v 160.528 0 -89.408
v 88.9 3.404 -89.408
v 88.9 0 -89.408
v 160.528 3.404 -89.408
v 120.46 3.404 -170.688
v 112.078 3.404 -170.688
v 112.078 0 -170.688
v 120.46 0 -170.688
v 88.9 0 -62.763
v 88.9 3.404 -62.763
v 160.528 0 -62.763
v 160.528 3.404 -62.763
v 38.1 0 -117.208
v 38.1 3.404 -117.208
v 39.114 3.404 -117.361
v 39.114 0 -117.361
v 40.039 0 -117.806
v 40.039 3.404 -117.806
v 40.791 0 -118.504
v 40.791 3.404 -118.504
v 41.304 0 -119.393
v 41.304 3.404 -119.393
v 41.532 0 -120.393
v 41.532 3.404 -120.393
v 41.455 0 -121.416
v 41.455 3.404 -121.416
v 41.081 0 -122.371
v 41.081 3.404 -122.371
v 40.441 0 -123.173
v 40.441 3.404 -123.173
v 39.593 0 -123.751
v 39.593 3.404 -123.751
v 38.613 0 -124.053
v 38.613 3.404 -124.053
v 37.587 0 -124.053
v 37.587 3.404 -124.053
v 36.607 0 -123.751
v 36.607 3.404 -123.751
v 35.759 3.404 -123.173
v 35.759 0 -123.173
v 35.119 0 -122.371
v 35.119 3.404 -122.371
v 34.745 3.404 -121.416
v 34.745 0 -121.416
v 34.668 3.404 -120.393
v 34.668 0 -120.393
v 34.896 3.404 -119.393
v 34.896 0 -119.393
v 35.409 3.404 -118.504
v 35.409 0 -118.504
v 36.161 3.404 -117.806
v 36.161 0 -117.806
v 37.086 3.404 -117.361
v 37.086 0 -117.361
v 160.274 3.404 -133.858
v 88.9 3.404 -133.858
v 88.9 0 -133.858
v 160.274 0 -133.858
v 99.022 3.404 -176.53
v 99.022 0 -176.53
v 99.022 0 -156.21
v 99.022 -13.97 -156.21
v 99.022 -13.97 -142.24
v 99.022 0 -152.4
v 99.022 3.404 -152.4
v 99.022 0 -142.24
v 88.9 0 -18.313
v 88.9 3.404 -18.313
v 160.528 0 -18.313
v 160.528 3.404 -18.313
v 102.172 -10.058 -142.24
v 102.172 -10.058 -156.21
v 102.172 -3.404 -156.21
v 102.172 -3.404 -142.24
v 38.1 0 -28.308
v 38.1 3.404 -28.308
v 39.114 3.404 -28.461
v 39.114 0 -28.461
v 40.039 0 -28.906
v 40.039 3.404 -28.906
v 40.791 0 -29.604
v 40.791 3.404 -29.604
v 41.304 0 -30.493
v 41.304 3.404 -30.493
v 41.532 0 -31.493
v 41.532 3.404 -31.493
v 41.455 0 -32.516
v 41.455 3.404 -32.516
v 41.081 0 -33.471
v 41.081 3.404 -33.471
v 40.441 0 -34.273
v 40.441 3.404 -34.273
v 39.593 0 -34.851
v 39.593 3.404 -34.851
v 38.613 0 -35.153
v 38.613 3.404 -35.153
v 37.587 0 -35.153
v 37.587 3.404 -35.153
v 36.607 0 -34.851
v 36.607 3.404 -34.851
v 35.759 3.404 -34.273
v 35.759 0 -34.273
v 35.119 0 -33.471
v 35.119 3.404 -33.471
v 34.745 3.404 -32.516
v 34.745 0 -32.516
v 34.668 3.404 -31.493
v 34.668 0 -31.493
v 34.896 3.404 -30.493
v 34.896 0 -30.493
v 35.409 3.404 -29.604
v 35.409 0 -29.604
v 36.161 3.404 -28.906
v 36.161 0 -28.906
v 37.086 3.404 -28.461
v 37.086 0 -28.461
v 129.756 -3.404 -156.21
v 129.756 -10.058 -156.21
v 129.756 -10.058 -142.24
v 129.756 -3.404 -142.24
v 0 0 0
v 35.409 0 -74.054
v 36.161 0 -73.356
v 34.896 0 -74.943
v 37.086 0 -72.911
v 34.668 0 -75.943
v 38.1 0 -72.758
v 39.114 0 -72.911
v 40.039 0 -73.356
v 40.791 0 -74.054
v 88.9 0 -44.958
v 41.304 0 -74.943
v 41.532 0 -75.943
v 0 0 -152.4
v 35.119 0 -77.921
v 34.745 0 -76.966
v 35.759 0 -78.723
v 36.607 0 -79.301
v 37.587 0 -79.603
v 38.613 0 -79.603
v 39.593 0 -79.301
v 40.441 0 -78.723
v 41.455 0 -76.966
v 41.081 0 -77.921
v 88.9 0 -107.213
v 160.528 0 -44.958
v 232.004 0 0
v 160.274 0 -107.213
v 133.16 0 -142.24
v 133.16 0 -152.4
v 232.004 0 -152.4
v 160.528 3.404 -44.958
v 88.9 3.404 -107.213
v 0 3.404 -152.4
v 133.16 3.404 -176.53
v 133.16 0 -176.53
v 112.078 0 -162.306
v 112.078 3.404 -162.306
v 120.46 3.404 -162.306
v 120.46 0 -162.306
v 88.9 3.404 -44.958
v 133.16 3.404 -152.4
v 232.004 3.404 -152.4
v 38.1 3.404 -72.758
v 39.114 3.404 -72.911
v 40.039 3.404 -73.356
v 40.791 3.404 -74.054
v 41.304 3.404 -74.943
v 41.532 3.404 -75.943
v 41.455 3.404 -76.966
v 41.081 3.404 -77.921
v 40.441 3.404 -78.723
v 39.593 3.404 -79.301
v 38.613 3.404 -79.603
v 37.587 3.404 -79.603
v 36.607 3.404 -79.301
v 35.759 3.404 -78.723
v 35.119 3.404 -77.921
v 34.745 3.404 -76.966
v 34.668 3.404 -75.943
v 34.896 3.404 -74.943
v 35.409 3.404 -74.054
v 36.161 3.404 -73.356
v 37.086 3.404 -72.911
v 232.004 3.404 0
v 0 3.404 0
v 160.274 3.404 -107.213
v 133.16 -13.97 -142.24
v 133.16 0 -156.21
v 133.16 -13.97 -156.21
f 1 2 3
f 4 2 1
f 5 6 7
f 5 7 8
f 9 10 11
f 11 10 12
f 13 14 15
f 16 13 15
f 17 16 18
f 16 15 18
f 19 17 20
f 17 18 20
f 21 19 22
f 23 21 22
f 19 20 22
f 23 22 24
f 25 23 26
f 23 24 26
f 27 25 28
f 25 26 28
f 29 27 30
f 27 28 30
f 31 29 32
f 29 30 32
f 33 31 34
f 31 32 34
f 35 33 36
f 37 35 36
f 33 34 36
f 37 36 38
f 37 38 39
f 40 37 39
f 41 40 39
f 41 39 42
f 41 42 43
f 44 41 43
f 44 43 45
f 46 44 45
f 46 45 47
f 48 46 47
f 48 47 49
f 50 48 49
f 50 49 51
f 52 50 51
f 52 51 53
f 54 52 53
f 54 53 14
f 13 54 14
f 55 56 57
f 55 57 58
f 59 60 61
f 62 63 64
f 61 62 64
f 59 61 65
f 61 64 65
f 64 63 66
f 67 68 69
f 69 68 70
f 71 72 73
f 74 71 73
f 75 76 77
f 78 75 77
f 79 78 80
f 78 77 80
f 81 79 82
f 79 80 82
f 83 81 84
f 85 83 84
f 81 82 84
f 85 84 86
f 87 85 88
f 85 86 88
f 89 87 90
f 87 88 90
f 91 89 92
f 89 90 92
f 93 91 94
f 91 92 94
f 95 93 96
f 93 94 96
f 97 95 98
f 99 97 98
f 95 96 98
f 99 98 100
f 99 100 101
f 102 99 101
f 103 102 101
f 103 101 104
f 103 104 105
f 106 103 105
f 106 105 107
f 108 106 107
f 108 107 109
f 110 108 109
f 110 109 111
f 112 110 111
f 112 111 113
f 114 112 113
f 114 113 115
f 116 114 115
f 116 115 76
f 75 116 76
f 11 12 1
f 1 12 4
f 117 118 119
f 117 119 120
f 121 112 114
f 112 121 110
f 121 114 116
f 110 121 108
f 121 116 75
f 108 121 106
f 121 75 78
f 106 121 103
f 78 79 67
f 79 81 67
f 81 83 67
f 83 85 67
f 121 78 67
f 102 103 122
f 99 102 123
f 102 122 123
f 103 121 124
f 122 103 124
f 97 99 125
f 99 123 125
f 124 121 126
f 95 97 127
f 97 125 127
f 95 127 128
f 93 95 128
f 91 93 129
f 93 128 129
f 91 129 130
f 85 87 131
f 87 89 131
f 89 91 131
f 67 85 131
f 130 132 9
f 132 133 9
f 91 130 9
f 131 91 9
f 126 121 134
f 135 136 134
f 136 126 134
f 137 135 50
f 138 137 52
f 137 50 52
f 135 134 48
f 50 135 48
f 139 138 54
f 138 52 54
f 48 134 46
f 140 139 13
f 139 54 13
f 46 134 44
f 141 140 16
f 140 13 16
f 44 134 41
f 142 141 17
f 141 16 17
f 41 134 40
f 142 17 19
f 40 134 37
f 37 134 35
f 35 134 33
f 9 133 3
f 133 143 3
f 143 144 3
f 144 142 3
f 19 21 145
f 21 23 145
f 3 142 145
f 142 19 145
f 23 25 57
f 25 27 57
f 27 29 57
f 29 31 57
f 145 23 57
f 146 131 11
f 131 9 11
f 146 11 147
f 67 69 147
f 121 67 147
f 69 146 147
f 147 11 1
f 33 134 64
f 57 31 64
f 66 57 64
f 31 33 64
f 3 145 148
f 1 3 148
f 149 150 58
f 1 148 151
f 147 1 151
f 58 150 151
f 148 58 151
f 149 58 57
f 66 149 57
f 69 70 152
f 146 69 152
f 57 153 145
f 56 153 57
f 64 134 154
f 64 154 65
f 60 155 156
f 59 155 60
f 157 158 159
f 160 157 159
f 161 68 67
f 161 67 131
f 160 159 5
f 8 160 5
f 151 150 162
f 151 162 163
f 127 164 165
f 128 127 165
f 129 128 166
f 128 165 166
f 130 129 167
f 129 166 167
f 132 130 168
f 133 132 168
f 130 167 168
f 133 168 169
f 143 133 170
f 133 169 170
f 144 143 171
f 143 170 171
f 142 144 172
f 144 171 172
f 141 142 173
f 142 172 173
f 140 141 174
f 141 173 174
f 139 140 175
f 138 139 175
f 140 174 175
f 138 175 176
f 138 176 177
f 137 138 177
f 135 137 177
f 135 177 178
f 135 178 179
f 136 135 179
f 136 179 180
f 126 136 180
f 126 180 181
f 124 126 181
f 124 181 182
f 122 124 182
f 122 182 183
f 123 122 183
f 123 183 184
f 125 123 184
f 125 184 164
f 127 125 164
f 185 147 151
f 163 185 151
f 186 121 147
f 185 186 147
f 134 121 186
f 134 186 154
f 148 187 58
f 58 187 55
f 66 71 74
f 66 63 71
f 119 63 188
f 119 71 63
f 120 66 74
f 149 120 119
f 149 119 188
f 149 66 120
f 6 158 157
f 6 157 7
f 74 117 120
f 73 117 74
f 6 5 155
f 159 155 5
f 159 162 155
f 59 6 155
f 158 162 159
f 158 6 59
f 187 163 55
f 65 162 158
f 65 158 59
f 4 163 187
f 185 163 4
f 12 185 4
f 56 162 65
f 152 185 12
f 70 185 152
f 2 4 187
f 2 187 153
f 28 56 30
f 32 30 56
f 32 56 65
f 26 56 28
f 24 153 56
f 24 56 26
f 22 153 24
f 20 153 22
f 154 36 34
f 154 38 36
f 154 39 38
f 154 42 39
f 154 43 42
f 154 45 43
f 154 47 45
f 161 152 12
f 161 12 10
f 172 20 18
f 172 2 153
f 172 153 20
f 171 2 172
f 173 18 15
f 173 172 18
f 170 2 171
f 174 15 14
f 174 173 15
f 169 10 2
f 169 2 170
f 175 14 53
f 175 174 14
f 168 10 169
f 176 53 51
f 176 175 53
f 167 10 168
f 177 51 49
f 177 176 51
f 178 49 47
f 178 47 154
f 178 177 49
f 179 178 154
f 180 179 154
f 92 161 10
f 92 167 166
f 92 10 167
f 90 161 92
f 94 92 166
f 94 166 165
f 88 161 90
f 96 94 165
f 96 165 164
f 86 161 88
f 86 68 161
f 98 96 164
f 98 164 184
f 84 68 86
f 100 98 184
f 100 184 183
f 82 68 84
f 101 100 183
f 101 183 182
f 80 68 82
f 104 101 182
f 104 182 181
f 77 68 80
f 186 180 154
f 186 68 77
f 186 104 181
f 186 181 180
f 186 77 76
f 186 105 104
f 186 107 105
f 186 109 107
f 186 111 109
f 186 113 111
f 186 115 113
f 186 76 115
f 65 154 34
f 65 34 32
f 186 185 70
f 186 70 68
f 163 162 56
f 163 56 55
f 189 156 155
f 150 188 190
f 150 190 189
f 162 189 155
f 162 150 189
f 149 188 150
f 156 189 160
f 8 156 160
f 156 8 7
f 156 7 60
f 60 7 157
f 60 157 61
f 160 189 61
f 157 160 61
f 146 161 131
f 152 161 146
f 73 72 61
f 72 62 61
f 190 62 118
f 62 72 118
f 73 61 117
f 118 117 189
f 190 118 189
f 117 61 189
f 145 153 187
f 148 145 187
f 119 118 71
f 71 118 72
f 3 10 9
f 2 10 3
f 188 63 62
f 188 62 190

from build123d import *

# Parameters (mm, degrees)
SKETCH1_W           = 232.0036
SKETCH1_H           = 152.4
BOSS_EXTRUDE1_DEPTH = 3.4036
SKETCH2_R           = 3.4417
SKETCH2_W           = 71.374
SKETCH2_H           = 26.6446
SKETCH2_W_2         = 71.628
CUT_EXTRUDE1_DEPTH  = 278.602260268
SKETCH3_W           = 34.1376
SKETCH3_H           = 13.97
BOSS_EXTRUDE2_DEPTH = 13.97
SKETCH4_W           = 27.5844
SKETCH4_H           = 6.6548
CUT_EXTRUDE2_DEPTH  = 16.51
SKETCH5_W           = 34.1376
SKETCH5_H           = 3.4036
BOSS_EXTRUDE3_DEPTH = 24.13
SKETCH6_W           = 8.382
SKETCH6_H           = 8.382
CUT_EXTRUDE3_DEPTH  = 293.04512201


with BuildPart() as part:
    # Sketch1 → Boss-Extrude1 (new body)
    with BuildSketch(Plane(origin=(0, 0, 0), x_dir=(1, 0, 0), z_dir=(0, 1, 0))):
        with Locations((116.0018, 76.2)):
            Rectangle(SKETCH1_W, SKETCH1_H)
    extrude(amount=BOSS_EXTRUDE1_DEPTH)

    # Sketch2 → Cut-Extrude1 (cut, through all)
    with BuildSketch(Plane(origin=(0, 3.4036, 0), x_dir=(1, 0, 0), z_dir=(0, 1, 0))):
        with Locations(Location((38.1, 120.65, 0), (0, 0, 270))):
            Circle(SKETCH2_R)
        with Locations(Location((38.1, 76.2, 0), (0, 0, 270))):
            Circle(SKETCH2_R)
        with Locations(Location((38.1, 31.75, 0), (0, 0, 270))):
            Circle(SKETCH2_R)
        with Locations((124.587, 120.5357)):
            Rectangle(SKETCH2_W, SKETCH2_H)
        with Locations((124.714, 76.0857)):
            Rectangle(SKETCH2_W_2, SKETCH2_H)
        with Locations((124.714, 31.6357)):
            Rectangle(SKETCH2_W_2, SKETCH2_H)
    extrude(amount=-CUT_EXTRUDE1_DEPTH, mode=Mode.SUBTRACT)

    # Sketch3 → Boss-Extrude2 (add)
    with BuildSketch(Plane.XZ):
        with Locations((116.0907, -149.225)):
            Rectangle(SKETCH3_W, SKETCH3_H)
    extrude(amount=BOSS_EXTRUDE2_DEPTH)

    # Sketch4 → Cut-Extrude2 (cut)
    with BuildSketch(Plane(origin=(0, 0, -156.21), x_dir=(-1, 0, 0), z_dir=(0, 0, -1))):
        with Locations((-115.9637, -6.731)):
            Rectangle(SKETCH4_W, SKETCH4_H)
    extrude(amount=-CUT_EXTRUDE2_DEPTH, mode=Mode.SUBTRACT)

    # Sketch5 → Boss-Extrude3 (add)
    with BuildSketch(Plane(origin=(0, 0, -152.4), x_dir=(-1, 0, 0), z_dir=(0, 0, -1))):
        with Locations((-116.0907, 1.7018)):
            Rectangle(SKETCH5_W, SKETCH5_H)
    extrude(amount=BOSS_EXTRUDE3_DEPTH)

    # Sketch6 → Cut-Extrude3 (cut, through all)
    with BuildSketch(Plane(origin=(0, 3.4036, 0), x_dir=(1, 0, 0), z_dir=(0, 1, 0))):
        with Locations((116.2685, 166.497)):
            Rectangle(SKETCH6_W, SKETCH6_H)
    extrude(amount=-CUT_EXTRUDE3_DEPTH, mode=Mode.SUBTRACT)


solid = part.part
